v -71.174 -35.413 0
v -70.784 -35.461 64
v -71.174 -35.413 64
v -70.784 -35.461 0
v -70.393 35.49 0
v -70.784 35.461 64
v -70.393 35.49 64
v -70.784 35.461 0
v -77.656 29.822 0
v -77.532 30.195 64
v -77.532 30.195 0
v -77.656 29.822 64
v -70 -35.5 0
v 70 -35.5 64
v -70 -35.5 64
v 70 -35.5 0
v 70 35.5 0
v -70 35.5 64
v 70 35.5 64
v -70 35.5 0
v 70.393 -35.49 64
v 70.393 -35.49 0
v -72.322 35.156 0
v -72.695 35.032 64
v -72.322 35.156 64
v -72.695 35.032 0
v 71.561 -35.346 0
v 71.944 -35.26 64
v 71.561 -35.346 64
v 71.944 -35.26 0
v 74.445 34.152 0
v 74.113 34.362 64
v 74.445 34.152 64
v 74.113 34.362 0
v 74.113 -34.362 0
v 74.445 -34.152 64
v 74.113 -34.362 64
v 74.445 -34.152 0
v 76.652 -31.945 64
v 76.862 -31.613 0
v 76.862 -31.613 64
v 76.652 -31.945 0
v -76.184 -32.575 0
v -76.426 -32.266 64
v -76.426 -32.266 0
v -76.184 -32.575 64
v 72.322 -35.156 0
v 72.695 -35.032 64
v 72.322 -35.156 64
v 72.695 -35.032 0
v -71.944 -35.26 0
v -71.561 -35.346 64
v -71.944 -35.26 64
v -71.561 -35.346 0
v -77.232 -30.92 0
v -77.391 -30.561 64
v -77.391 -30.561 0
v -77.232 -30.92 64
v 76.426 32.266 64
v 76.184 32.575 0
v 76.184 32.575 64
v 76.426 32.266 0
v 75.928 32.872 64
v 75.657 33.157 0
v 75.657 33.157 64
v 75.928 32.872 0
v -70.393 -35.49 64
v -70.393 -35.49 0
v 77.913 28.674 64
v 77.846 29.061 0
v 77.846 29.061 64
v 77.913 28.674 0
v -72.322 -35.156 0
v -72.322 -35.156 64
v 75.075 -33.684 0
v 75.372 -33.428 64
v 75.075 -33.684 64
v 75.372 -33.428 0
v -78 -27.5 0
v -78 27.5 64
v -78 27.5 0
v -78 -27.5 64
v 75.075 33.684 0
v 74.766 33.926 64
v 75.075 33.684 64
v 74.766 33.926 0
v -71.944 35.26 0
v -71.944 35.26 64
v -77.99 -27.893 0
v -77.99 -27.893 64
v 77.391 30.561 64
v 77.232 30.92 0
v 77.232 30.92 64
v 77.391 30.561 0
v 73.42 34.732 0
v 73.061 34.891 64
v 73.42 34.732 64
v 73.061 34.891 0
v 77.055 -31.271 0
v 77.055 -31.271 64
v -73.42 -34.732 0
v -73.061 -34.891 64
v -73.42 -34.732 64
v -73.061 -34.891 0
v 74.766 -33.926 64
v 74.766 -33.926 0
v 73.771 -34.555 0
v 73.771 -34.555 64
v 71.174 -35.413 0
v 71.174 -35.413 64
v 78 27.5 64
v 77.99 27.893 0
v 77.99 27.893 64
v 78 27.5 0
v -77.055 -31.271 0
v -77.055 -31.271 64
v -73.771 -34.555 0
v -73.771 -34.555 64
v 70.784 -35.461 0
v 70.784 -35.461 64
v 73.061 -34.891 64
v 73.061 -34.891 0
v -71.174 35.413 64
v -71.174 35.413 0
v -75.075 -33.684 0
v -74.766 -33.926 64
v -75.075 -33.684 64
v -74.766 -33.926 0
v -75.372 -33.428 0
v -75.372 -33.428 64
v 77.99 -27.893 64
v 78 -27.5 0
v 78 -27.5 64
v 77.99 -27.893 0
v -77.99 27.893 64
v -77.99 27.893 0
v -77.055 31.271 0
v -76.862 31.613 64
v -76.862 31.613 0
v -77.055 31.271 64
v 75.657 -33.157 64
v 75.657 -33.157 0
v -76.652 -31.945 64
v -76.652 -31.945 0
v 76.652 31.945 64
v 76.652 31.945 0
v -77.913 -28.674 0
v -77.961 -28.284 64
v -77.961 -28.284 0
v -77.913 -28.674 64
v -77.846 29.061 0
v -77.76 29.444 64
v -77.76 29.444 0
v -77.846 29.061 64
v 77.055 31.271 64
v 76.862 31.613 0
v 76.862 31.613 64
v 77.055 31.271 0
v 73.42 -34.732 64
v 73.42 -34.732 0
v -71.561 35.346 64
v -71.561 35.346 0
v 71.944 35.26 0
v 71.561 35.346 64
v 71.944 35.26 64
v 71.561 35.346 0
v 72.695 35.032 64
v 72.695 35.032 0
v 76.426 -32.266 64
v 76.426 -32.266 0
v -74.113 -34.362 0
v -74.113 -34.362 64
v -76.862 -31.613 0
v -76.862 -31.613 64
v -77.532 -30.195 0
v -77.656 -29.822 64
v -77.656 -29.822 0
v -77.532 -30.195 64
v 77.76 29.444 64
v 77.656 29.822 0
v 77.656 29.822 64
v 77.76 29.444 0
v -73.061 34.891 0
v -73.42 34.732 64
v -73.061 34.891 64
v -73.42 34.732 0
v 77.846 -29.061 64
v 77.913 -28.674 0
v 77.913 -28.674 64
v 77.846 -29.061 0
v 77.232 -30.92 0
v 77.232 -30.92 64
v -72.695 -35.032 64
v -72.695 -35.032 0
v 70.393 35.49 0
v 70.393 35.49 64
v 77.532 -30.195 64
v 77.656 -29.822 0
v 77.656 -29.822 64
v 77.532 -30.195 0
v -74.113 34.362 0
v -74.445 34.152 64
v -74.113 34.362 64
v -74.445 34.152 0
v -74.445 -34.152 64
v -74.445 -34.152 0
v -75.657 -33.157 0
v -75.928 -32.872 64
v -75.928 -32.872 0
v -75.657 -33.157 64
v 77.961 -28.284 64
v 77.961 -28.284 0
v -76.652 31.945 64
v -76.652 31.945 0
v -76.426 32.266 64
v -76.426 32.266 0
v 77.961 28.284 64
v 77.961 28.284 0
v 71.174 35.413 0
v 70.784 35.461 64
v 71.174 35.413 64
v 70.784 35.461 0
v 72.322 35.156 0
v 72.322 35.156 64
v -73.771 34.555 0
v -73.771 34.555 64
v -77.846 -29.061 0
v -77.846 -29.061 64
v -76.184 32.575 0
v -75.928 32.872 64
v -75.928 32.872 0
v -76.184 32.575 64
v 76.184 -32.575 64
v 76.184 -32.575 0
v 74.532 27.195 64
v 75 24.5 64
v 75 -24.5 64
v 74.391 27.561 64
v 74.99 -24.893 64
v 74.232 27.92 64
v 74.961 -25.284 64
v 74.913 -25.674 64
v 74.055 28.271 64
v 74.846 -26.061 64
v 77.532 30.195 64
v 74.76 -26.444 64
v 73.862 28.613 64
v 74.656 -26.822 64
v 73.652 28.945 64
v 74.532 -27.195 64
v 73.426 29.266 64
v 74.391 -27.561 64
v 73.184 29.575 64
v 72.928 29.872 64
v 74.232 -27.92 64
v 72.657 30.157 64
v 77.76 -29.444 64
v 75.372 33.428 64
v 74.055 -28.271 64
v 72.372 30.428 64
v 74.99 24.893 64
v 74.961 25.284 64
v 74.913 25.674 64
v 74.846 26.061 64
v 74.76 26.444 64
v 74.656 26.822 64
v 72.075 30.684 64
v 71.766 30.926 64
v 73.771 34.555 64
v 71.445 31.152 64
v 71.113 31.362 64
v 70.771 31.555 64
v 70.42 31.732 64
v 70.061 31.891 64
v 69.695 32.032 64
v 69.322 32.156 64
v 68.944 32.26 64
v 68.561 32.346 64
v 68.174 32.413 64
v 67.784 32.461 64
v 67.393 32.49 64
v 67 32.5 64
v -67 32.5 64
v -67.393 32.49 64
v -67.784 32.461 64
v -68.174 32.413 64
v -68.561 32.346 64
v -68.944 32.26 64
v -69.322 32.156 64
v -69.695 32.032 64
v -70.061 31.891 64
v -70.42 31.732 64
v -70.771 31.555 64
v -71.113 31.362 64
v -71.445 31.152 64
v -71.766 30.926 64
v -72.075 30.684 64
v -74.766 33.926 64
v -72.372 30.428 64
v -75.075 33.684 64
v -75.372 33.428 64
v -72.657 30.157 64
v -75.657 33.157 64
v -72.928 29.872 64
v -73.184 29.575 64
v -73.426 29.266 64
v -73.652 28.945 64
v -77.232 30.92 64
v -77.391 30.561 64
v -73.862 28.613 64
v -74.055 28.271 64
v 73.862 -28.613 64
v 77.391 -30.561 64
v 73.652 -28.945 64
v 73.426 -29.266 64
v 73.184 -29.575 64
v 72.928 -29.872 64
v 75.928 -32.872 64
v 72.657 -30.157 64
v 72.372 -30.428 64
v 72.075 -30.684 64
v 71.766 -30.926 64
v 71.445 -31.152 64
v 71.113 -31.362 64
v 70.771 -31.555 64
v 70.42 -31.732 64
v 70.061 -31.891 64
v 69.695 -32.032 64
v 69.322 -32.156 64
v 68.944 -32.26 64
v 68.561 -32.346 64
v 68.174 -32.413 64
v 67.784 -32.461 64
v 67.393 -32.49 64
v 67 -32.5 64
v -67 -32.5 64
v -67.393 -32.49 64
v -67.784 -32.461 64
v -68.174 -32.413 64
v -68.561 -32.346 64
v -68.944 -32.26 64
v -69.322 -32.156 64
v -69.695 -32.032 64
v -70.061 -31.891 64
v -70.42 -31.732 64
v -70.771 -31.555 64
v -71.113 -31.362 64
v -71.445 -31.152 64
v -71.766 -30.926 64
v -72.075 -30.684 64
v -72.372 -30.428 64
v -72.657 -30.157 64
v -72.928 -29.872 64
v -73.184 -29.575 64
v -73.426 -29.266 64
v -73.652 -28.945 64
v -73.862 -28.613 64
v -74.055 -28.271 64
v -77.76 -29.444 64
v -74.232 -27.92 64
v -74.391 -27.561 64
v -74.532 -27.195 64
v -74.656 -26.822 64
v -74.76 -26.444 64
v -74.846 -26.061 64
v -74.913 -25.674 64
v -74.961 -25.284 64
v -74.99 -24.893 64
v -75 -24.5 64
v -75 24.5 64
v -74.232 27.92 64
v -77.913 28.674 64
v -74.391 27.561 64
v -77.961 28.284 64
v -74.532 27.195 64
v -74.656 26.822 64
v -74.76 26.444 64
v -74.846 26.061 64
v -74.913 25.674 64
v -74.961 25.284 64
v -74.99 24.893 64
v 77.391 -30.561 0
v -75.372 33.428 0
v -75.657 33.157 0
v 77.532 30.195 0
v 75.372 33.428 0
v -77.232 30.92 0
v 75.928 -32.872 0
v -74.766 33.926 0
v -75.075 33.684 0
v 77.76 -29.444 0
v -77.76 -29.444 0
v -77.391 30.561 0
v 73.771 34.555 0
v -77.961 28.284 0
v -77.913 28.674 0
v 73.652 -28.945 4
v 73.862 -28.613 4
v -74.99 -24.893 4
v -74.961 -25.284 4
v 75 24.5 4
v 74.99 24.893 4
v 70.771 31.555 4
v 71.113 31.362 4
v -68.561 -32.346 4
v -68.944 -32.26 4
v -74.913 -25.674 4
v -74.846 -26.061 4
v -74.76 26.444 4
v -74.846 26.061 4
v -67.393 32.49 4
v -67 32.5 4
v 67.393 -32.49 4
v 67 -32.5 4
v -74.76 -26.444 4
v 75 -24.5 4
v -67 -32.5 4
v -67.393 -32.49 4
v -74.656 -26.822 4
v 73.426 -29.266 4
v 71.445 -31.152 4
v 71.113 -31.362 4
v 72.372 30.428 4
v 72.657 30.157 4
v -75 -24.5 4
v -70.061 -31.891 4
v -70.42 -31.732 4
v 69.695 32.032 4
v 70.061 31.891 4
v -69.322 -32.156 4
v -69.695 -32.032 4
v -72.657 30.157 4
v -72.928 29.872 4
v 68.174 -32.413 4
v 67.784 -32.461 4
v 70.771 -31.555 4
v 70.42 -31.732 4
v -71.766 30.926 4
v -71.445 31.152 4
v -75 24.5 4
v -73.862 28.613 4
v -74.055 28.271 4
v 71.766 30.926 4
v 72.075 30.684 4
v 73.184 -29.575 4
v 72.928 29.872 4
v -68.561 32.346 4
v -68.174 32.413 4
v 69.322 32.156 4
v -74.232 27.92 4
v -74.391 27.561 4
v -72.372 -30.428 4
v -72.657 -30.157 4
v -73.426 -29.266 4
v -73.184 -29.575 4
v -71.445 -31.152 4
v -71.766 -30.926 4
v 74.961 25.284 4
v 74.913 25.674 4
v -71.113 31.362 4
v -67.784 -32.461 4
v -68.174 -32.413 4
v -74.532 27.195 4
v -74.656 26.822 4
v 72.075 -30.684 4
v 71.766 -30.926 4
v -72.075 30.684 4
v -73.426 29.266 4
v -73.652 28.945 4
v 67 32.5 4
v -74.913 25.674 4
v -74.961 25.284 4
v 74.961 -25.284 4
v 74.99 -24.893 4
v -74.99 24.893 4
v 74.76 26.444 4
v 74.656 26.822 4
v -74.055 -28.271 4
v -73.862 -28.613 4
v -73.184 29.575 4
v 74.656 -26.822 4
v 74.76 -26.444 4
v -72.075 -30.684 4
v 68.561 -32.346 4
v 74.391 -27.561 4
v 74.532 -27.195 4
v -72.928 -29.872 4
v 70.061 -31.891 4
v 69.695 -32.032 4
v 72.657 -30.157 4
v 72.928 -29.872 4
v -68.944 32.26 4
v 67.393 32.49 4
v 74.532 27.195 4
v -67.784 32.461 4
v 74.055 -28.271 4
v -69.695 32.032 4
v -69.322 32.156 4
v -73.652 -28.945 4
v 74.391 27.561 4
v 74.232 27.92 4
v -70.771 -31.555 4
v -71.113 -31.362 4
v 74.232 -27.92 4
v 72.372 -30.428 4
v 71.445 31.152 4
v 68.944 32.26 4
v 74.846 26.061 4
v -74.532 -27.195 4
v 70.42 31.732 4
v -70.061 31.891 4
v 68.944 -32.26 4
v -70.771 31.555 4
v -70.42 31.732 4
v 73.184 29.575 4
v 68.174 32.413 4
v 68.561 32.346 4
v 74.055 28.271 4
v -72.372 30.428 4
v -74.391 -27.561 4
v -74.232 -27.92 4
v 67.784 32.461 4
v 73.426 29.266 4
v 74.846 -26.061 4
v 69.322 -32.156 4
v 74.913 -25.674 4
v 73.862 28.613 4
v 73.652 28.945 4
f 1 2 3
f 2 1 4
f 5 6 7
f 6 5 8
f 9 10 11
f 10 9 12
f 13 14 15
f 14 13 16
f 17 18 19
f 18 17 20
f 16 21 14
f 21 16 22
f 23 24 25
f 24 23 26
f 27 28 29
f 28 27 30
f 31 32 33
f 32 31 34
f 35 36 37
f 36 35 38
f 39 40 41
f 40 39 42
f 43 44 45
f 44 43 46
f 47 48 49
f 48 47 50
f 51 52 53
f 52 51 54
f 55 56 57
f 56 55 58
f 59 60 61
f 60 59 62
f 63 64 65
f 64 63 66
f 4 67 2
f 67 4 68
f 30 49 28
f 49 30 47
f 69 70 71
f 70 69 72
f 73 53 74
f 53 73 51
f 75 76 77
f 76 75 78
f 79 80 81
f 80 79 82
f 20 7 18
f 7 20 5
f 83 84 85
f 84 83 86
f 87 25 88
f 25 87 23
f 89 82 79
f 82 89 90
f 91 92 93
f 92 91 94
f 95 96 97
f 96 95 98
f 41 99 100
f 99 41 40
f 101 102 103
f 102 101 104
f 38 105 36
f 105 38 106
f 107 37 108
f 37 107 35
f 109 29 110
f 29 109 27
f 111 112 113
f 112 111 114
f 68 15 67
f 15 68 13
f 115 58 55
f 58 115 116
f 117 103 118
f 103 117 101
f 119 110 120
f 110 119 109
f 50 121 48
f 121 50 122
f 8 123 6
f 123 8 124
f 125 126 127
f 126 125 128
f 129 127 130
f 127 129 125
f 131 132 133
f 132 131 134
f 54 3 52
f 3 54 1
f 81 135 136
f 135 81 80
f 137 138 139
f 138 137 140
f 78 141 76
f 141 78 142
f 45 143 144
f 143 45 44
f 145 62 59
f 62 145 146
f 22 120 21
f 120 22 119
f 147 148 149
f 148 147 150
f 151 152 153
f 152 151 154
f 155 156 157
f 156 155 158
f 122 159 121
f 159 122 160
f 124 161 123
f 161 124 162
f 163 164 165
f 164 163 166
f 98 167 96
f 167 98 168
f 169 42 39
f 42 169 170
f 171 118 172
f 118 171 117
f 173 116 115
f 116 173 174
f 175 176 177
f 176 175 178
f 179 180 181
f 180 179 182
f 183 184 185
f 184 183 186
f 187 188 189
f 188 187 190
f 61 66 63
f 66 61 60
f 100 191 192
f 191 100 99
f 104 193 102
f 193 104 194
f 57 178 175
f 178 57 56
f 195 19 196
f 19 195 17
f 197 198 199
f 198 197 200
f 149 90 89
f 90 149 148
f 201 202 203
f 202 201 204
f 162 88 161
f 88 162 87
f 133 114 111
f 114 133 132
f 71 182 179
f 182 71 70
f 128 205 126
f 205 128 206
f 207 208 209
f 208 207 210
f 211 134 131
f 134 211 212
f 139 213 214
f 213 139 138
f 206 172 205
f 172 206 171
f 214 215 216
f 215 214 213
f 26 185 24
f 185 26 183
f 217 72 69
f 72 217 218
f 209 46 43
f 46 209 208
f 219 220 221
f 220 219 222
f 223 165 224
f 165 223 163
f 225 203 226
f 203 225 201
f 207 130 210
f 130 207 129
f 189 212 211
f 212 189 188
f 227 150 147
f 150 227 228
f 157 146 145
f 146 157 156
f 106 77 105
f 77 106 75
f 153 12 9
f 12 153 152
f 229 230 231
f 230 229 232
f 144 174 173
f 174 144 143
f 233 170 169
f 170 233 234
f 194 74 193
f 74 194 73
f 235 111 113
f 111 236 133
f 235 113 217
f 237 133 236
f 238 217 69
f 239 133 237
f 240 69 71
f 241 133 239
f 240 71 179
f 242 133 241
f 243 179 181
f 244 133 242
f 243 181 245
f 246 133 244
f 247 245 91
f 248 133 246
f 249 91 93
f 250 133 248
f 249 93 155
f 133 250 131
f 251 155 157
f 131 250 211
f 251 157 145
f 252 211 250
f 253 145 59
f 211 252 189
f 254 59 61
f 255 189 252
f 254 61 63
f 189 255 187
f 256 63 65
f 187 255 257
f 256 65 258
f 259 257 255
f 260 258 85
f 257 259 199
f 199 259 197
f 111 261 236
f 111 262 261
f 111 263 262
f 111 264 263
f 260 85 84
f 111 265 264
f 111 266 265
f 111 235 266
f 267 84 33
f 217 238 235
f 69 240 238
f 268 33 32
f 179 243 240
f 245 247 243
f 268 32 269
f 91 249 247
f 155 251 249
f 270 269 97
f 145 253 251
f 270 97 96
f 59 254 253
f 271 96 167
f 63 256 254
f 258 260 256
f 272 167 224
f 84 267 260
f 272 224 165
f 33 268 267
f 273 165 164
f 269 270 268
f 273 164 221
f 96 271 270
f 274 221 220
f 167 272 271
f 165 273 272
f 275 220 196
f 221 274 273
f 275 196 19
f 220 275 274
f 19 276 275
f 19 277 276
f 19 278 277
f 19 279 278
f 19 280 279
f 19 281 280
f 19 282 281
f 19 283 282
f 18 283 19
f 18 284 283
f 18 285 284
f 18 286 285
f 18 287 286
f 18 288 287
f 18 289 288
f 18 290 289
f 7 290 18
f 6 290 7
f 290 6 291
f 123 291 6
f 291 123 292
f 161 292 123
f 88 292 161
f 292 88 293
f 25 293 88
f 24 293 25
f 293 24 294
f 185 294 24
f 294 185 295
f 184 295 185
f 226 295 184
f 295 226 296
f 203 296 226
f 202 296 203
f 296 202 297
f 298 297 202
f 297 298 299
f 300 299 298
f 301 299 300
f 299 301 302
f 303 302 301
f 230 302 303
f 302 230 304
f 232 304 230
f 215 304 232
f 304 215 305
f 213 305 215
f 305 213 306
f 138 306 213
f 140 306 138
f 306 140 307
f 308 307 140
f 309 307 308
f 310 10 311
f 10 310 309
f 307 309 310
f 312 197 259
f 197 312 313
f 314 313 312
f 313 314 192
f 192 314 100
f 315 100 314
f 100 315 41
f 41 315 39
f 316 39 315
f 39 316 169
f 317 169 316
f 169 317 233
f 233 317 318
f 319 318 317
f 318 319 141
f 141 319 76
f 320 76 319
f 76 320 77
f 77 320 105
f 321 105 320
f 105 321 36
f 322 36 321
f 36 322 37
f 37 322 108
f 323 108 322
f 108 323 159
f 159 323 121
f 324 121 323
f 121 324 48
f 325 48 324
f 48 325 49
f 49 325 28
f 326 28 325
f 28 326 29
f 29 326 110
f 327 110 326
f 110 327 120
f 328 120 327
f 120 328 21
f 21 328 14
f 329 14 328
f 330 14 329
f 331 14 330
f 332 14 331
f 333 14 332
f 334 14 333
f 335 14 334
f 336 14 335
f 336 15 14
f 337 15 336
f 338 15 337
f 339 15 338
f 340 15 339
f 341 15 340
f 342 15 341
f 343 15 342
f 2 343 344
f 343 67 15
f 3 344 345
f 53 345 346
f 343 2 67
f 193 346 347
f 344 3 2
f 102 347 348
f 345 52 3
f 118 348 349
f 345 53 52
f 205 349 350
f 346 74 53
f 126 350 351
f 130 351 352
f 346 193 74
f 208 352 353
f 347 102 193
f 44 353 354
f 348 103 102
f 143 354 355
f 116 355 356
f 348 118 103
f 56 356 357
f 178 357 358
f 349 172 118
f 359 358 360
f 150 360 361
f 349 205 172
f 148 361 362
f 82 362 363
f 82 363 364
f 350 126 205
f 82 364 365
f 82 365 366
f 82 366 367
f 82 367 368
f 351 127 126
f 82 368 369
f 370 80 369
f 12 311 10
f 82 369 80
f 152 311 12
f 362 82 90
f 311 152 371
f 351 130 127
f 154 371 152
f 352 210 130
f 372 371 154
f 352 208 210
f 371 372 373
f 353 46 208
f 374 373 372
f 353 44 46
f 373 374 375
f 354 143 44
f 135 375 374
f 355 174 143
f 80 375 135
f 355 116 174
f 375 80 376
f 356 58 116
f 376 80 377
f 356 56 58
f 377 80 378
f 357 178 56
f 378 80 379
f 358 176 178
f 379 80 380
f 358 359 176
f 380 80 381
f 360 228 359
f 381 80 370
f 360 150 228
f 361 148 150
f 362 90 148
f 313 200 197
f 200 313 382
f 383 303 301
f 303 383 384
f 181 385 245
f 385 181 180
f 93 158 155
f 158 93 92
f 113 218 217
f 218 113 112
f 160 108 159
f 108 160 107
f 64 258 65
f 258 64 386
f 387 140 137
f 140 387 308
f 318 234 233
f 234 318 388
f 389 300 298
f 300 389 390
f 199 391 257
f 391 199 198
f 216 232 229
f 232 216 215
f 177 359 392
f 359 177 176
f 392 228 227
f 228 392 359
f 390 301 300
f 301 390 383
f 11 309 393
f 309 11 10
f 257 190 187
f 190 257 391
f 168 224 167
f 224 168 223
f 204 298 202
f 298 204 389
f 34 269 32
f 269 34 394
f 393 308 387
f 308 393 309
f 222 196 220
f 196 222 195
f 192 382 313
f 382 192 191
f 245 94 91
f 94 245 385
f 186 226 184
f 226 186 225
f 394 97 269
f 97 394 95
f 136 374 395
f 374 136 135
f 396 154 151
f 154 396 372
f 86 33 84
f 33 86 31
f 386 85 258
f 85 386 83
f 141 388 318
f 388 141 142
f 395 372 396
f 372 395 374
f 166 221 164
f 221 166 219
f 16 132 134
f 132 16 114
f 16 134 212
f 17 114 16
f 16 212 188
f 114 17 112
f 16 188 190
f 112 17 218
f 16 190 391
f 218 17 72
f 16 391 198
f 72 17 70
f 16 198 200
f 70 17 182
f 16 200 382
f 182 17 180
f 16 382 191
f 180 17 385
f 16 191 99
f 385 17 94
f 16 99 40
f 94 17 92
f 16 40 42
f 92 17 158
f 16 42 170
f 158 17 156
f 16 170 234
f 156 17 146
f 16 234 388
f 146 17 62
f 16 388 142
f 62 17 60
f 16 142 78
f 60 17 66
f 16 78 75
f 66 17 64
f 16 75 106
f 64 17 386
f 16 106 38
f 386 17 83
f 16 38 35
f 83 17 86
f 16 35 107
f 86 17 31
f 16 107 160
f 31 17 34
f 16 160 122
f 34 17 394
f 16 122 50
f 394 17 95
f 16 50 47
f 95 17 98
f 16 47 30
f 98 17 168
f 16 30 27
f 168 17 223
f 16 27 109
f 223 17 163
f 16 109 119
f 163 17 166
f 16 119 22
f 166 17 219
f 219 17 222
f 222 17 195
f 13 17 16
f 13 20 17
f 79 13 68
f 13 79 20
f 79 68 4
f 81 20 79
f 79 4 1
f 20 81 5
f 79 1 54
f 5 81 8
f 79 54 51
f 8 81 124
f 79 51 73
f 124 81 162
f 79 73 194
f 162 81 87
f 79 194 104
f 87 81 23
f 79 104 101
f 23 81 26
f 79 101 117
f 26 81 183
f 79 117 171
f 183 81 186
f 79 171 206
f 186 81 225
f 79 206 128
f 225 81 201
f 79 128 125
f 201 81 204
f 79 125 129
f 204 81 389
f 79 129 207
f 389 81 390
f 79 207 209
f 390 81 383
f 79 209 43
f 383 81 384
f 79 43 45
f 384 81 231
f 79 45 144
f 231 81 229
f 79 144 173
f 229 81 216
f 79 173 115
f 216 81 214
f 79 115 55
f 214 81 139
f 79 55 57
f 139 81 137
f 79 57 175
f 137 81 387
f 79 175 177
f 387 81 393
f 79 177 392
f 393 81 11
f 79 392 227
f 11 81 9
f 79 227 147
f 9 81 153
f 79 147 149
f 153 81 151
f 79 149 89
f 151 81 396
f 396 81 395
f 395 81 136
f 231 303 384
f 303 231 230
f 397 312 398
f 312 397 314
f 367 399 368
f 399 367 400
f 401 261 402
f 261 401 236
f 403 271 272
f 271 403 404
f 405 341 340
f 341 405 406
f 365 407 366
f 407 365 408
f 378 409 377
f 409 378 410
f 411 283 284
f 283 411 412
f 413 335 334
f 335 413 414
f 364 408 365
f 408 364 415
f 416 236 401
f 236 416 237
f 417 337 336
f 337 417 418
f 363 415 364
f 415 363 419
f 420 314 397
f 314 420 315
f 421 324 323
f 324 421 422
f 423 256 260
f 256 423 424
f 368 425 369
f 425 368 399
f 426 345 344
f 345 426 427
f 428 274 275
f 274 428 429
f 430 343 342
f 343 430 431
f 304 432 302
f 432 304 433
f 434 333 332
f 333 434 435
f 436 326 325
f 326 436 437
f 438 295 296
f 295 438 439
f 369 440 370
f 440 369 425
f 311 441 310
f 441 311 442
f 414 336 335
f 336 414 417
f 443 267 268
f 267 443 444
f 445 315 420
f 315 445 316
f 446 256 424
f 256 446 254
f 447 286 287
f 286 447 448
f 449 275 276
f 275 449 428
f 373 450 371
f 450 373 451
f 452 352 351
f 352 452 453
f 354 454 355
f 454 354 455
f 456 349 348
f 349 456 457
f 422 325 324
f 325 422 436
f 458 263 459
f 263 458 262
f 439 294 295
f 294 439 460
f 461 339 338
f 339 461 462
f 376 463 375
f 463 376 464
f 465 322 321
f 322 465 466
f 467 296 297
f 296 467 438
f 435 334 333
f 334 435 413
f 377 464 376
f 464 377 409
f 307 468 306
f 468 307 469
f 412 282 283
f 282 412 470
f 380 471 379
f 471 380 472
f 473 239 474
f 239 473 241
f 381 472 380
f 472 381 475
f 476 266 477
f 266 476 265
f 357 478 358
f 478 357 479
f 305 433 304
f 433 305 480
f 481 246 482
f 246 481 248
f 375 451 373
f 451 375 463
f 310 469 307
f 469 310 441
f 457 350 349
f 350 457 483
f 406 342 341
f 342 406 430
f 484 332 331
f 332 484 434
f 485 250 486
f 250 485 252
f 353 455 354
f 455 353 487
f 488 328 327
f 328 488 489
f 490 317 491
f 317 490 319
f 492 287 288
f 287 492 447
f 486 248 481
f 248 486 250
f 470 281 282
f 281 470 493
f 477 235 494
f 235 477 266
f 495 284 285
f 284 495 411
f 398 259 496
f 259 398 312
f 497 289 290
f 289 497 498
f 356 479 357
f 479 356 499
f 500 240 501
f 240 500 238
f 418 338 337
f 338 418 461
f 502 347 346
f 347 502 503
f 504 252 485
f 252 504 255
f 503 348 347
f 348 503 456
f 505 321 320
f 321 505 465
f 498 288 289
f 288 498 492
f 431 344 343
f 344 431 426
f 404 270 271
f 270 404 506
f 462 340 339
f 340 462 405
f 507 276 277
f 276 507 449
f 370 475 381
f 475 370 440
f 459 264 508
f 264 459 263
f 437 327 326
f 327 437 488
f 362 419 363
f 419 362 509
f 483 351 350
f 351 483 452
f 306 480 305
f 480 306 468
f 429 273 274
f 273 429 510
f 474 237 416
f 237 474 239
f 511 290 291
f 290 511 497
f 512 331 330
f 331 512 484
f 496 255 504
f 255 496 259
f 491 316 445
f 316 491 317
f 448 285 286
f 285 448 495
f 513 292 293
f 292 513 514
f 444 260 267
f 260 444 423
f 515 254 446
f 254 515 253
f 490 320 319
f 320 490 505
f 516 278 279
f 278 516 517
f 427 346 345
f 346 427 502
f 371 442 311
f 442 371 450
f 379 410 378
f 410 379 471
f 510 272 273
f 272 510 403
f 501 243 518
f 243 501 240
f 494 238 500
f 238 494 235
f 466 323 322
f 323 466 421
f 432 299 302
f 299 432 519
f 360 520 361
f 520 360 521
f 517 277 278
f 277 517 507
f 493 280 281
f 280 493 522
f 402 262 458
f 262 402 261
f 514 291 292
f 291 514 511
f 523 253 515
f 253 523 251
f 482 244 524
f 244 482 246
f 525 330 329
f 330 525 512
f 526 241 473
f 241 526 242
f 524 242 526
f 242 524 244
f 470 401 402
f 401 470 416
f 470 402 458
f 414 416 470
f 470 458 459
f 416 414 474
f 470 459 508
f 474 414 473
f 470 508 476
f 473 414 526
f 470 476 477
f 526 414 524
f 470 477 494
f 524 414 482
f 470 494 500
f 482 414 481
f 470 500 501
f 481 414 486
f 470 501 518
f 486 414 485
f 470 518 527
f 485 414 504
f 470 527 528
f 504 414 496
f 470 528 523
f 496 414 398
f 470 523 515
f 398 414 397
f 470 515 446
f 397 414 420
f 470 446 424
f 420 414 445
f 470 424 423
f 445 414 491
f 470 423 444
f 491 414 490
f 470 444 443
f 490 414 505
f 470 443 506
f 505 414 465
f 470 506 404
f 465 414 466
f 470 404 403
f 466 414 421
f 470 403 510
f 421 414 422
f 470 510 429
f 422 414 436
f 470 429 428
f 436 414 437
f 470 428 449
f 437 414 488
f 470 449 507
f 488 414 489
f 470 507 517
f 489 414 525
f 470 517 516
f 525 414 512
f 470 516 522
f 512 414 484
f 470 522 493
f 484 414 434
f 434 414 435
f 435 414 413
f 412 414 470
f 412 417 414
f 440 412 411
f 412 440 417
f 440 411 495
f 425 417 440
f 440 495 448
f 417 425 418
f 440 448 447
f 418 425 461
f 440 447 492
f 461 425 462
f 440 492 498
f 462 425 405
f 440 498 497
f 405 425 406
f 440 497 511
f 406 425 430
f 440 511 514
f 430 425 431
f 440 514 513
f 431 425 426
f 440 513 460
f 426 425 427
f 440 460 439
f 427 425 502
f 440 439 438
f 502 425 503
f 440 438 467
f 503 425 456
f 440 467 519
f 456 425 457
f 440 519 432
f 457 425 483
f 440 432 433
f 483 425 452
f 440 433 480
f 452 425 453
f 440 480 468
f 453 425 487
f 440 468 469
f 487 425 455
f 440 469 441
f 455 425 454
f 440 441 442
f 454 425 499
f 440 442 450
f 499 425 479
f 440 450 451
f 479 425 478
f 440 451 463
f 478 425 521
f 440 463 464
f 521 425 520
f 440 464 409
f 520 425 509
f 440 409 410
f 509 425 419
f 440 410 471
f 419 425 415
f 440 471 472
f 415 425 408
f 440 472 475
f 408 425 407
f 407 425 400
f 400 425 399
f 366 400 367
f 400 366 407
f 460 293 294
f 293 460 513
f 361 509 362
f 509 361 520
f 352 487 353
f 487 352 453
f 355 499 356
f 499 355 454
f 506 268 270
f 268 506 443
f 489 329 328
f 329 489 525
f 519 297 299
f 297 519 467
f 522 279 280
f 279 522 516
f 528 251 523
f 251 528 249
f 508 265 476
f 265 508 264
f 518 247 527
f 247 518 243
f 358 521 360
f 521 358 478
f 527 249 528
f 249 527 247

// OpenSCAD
// file: box.scad
//=====================================================================
// box.scad
//
// Generic rounded box
//
// Origin:
//   X = centre
//   Y = centre
//   Z = bottom
//
//=====================================================================


//--------------------------------------------------
// Rounded corner
//--------------------------------------------------

module corner(x, y, height, radius)
{
    translate([x, y, 0])
        cylinder(
            h = height,
            r = radius
        );
}


//--------------------------------------------------
// Outside shell
//--------------------------------------------------

module shell(
    outside_length,
    outside_width,
    outside_height,
    corner_radius
)
{
    hull()
    {
        corner(
            -(outside_length / 2) + corner_radius,
            -(outside_width / 2) + corner_radius,
            outside_height,
            corner_radius
        );

        corner(
             (outside_length / 2) - corner_radius,
            -(outside_width / 2) + corner_radius,
            outside_height,
            corner_radius
        );

        corner(
             (outside_length / 2) - corner_radius,
             (outside_width / 2) - corner_radius,
            outside_height,
            corner_radius
        );

        corner(
            -(outside_length / 2) + corner_radius,
             (outside_width / 2) - corner_radius,
            outside_height,
            corner_radius
        );
    }
}


//--------------------------------------------------
// Inside cavity
//--------------------------------------------------

module cavity(
    inside_length,
    inside_width,
    inside_height,
    wall_thickness,
    bottom_thickness,
    corner_radius,
    boolean_overlap = 1
)
{
    translate([
        0,
        0,
        bottom_thickness
    ])

    hull()
    {
        corner(
            -(inside_length / 2) + corner_radius,
            -(inside_width / 2) + corner_radius,
            inside_height + boolean_overlap,
            corner_radius
        );

        corner(
             (inside_length / 2) - corner_radius,
            -(inside_width / 2) + corner_radius,
            inside_height + boolean_overlap,
            corner_radius
        );

        corner(
             (inside_length / 2) - corner_radius,
             (inside_width / 2) - corner_radius,
            inside_height + boolean_overlap,
            corner_radius
        );

        corner(
            -(inside_length / 2) + corner_radius,
             (inside_width / 2) - corner_radius,
            inside_height + boolean_overlap,
            corner_radius
        );
    }
}


//--------------------------------------------------
// Rounded box
//--------------------------------------------------

module box(
    inside_length,
    inside_width,
    inside_height,

    wall_thickness,
    bottom_thickness,

    corner_radius,

    boolean_overlap = 1
)
{
    outside_length =
        inside_length +
        (2 * wall_thickness);

    outside_width =
        inside_width +
        (2 * wall_thickness);

    outside_height =
        inside_height +
        bottom_thickness;

    difference()
    {
        shell(
            outside_length,
            outside_width,
            outside_height,
            corner_radius
        );

        cavity(
            inside_length,
            inside_width,
            inside_height,
            wall_thickness,
            bottom_thickness,
            corner_radius,
            boolean_overlap
        );
    }
}
// main file
//=====================================================================
// YAPPE
// Test Box
//
// Tests the generic box() module.
//
//=====================================================================

use <box.scad>


//--------------------------------------------------
// Rendering
//--------------------------------------------------

preview_fn = 24;
render_fn  = 128;

$fn = $preview ? preview_fn : render_fn;


//--------------------------------------------------
// Test dimensions
//--------------------------------------------------

inside_length = 150;
inside_width  = 65;
inside_height = 60;

wall_thickness   = 3;
floor_thickness  = 4;

corner_radius = 8;


//--------------------------------------------------
// Test
//--------------------------------------------------

box(
    inside_length,
    inside_width,
    inside_height,

    wall_thickness,
    floor_thickness,

    corner_radius
);
